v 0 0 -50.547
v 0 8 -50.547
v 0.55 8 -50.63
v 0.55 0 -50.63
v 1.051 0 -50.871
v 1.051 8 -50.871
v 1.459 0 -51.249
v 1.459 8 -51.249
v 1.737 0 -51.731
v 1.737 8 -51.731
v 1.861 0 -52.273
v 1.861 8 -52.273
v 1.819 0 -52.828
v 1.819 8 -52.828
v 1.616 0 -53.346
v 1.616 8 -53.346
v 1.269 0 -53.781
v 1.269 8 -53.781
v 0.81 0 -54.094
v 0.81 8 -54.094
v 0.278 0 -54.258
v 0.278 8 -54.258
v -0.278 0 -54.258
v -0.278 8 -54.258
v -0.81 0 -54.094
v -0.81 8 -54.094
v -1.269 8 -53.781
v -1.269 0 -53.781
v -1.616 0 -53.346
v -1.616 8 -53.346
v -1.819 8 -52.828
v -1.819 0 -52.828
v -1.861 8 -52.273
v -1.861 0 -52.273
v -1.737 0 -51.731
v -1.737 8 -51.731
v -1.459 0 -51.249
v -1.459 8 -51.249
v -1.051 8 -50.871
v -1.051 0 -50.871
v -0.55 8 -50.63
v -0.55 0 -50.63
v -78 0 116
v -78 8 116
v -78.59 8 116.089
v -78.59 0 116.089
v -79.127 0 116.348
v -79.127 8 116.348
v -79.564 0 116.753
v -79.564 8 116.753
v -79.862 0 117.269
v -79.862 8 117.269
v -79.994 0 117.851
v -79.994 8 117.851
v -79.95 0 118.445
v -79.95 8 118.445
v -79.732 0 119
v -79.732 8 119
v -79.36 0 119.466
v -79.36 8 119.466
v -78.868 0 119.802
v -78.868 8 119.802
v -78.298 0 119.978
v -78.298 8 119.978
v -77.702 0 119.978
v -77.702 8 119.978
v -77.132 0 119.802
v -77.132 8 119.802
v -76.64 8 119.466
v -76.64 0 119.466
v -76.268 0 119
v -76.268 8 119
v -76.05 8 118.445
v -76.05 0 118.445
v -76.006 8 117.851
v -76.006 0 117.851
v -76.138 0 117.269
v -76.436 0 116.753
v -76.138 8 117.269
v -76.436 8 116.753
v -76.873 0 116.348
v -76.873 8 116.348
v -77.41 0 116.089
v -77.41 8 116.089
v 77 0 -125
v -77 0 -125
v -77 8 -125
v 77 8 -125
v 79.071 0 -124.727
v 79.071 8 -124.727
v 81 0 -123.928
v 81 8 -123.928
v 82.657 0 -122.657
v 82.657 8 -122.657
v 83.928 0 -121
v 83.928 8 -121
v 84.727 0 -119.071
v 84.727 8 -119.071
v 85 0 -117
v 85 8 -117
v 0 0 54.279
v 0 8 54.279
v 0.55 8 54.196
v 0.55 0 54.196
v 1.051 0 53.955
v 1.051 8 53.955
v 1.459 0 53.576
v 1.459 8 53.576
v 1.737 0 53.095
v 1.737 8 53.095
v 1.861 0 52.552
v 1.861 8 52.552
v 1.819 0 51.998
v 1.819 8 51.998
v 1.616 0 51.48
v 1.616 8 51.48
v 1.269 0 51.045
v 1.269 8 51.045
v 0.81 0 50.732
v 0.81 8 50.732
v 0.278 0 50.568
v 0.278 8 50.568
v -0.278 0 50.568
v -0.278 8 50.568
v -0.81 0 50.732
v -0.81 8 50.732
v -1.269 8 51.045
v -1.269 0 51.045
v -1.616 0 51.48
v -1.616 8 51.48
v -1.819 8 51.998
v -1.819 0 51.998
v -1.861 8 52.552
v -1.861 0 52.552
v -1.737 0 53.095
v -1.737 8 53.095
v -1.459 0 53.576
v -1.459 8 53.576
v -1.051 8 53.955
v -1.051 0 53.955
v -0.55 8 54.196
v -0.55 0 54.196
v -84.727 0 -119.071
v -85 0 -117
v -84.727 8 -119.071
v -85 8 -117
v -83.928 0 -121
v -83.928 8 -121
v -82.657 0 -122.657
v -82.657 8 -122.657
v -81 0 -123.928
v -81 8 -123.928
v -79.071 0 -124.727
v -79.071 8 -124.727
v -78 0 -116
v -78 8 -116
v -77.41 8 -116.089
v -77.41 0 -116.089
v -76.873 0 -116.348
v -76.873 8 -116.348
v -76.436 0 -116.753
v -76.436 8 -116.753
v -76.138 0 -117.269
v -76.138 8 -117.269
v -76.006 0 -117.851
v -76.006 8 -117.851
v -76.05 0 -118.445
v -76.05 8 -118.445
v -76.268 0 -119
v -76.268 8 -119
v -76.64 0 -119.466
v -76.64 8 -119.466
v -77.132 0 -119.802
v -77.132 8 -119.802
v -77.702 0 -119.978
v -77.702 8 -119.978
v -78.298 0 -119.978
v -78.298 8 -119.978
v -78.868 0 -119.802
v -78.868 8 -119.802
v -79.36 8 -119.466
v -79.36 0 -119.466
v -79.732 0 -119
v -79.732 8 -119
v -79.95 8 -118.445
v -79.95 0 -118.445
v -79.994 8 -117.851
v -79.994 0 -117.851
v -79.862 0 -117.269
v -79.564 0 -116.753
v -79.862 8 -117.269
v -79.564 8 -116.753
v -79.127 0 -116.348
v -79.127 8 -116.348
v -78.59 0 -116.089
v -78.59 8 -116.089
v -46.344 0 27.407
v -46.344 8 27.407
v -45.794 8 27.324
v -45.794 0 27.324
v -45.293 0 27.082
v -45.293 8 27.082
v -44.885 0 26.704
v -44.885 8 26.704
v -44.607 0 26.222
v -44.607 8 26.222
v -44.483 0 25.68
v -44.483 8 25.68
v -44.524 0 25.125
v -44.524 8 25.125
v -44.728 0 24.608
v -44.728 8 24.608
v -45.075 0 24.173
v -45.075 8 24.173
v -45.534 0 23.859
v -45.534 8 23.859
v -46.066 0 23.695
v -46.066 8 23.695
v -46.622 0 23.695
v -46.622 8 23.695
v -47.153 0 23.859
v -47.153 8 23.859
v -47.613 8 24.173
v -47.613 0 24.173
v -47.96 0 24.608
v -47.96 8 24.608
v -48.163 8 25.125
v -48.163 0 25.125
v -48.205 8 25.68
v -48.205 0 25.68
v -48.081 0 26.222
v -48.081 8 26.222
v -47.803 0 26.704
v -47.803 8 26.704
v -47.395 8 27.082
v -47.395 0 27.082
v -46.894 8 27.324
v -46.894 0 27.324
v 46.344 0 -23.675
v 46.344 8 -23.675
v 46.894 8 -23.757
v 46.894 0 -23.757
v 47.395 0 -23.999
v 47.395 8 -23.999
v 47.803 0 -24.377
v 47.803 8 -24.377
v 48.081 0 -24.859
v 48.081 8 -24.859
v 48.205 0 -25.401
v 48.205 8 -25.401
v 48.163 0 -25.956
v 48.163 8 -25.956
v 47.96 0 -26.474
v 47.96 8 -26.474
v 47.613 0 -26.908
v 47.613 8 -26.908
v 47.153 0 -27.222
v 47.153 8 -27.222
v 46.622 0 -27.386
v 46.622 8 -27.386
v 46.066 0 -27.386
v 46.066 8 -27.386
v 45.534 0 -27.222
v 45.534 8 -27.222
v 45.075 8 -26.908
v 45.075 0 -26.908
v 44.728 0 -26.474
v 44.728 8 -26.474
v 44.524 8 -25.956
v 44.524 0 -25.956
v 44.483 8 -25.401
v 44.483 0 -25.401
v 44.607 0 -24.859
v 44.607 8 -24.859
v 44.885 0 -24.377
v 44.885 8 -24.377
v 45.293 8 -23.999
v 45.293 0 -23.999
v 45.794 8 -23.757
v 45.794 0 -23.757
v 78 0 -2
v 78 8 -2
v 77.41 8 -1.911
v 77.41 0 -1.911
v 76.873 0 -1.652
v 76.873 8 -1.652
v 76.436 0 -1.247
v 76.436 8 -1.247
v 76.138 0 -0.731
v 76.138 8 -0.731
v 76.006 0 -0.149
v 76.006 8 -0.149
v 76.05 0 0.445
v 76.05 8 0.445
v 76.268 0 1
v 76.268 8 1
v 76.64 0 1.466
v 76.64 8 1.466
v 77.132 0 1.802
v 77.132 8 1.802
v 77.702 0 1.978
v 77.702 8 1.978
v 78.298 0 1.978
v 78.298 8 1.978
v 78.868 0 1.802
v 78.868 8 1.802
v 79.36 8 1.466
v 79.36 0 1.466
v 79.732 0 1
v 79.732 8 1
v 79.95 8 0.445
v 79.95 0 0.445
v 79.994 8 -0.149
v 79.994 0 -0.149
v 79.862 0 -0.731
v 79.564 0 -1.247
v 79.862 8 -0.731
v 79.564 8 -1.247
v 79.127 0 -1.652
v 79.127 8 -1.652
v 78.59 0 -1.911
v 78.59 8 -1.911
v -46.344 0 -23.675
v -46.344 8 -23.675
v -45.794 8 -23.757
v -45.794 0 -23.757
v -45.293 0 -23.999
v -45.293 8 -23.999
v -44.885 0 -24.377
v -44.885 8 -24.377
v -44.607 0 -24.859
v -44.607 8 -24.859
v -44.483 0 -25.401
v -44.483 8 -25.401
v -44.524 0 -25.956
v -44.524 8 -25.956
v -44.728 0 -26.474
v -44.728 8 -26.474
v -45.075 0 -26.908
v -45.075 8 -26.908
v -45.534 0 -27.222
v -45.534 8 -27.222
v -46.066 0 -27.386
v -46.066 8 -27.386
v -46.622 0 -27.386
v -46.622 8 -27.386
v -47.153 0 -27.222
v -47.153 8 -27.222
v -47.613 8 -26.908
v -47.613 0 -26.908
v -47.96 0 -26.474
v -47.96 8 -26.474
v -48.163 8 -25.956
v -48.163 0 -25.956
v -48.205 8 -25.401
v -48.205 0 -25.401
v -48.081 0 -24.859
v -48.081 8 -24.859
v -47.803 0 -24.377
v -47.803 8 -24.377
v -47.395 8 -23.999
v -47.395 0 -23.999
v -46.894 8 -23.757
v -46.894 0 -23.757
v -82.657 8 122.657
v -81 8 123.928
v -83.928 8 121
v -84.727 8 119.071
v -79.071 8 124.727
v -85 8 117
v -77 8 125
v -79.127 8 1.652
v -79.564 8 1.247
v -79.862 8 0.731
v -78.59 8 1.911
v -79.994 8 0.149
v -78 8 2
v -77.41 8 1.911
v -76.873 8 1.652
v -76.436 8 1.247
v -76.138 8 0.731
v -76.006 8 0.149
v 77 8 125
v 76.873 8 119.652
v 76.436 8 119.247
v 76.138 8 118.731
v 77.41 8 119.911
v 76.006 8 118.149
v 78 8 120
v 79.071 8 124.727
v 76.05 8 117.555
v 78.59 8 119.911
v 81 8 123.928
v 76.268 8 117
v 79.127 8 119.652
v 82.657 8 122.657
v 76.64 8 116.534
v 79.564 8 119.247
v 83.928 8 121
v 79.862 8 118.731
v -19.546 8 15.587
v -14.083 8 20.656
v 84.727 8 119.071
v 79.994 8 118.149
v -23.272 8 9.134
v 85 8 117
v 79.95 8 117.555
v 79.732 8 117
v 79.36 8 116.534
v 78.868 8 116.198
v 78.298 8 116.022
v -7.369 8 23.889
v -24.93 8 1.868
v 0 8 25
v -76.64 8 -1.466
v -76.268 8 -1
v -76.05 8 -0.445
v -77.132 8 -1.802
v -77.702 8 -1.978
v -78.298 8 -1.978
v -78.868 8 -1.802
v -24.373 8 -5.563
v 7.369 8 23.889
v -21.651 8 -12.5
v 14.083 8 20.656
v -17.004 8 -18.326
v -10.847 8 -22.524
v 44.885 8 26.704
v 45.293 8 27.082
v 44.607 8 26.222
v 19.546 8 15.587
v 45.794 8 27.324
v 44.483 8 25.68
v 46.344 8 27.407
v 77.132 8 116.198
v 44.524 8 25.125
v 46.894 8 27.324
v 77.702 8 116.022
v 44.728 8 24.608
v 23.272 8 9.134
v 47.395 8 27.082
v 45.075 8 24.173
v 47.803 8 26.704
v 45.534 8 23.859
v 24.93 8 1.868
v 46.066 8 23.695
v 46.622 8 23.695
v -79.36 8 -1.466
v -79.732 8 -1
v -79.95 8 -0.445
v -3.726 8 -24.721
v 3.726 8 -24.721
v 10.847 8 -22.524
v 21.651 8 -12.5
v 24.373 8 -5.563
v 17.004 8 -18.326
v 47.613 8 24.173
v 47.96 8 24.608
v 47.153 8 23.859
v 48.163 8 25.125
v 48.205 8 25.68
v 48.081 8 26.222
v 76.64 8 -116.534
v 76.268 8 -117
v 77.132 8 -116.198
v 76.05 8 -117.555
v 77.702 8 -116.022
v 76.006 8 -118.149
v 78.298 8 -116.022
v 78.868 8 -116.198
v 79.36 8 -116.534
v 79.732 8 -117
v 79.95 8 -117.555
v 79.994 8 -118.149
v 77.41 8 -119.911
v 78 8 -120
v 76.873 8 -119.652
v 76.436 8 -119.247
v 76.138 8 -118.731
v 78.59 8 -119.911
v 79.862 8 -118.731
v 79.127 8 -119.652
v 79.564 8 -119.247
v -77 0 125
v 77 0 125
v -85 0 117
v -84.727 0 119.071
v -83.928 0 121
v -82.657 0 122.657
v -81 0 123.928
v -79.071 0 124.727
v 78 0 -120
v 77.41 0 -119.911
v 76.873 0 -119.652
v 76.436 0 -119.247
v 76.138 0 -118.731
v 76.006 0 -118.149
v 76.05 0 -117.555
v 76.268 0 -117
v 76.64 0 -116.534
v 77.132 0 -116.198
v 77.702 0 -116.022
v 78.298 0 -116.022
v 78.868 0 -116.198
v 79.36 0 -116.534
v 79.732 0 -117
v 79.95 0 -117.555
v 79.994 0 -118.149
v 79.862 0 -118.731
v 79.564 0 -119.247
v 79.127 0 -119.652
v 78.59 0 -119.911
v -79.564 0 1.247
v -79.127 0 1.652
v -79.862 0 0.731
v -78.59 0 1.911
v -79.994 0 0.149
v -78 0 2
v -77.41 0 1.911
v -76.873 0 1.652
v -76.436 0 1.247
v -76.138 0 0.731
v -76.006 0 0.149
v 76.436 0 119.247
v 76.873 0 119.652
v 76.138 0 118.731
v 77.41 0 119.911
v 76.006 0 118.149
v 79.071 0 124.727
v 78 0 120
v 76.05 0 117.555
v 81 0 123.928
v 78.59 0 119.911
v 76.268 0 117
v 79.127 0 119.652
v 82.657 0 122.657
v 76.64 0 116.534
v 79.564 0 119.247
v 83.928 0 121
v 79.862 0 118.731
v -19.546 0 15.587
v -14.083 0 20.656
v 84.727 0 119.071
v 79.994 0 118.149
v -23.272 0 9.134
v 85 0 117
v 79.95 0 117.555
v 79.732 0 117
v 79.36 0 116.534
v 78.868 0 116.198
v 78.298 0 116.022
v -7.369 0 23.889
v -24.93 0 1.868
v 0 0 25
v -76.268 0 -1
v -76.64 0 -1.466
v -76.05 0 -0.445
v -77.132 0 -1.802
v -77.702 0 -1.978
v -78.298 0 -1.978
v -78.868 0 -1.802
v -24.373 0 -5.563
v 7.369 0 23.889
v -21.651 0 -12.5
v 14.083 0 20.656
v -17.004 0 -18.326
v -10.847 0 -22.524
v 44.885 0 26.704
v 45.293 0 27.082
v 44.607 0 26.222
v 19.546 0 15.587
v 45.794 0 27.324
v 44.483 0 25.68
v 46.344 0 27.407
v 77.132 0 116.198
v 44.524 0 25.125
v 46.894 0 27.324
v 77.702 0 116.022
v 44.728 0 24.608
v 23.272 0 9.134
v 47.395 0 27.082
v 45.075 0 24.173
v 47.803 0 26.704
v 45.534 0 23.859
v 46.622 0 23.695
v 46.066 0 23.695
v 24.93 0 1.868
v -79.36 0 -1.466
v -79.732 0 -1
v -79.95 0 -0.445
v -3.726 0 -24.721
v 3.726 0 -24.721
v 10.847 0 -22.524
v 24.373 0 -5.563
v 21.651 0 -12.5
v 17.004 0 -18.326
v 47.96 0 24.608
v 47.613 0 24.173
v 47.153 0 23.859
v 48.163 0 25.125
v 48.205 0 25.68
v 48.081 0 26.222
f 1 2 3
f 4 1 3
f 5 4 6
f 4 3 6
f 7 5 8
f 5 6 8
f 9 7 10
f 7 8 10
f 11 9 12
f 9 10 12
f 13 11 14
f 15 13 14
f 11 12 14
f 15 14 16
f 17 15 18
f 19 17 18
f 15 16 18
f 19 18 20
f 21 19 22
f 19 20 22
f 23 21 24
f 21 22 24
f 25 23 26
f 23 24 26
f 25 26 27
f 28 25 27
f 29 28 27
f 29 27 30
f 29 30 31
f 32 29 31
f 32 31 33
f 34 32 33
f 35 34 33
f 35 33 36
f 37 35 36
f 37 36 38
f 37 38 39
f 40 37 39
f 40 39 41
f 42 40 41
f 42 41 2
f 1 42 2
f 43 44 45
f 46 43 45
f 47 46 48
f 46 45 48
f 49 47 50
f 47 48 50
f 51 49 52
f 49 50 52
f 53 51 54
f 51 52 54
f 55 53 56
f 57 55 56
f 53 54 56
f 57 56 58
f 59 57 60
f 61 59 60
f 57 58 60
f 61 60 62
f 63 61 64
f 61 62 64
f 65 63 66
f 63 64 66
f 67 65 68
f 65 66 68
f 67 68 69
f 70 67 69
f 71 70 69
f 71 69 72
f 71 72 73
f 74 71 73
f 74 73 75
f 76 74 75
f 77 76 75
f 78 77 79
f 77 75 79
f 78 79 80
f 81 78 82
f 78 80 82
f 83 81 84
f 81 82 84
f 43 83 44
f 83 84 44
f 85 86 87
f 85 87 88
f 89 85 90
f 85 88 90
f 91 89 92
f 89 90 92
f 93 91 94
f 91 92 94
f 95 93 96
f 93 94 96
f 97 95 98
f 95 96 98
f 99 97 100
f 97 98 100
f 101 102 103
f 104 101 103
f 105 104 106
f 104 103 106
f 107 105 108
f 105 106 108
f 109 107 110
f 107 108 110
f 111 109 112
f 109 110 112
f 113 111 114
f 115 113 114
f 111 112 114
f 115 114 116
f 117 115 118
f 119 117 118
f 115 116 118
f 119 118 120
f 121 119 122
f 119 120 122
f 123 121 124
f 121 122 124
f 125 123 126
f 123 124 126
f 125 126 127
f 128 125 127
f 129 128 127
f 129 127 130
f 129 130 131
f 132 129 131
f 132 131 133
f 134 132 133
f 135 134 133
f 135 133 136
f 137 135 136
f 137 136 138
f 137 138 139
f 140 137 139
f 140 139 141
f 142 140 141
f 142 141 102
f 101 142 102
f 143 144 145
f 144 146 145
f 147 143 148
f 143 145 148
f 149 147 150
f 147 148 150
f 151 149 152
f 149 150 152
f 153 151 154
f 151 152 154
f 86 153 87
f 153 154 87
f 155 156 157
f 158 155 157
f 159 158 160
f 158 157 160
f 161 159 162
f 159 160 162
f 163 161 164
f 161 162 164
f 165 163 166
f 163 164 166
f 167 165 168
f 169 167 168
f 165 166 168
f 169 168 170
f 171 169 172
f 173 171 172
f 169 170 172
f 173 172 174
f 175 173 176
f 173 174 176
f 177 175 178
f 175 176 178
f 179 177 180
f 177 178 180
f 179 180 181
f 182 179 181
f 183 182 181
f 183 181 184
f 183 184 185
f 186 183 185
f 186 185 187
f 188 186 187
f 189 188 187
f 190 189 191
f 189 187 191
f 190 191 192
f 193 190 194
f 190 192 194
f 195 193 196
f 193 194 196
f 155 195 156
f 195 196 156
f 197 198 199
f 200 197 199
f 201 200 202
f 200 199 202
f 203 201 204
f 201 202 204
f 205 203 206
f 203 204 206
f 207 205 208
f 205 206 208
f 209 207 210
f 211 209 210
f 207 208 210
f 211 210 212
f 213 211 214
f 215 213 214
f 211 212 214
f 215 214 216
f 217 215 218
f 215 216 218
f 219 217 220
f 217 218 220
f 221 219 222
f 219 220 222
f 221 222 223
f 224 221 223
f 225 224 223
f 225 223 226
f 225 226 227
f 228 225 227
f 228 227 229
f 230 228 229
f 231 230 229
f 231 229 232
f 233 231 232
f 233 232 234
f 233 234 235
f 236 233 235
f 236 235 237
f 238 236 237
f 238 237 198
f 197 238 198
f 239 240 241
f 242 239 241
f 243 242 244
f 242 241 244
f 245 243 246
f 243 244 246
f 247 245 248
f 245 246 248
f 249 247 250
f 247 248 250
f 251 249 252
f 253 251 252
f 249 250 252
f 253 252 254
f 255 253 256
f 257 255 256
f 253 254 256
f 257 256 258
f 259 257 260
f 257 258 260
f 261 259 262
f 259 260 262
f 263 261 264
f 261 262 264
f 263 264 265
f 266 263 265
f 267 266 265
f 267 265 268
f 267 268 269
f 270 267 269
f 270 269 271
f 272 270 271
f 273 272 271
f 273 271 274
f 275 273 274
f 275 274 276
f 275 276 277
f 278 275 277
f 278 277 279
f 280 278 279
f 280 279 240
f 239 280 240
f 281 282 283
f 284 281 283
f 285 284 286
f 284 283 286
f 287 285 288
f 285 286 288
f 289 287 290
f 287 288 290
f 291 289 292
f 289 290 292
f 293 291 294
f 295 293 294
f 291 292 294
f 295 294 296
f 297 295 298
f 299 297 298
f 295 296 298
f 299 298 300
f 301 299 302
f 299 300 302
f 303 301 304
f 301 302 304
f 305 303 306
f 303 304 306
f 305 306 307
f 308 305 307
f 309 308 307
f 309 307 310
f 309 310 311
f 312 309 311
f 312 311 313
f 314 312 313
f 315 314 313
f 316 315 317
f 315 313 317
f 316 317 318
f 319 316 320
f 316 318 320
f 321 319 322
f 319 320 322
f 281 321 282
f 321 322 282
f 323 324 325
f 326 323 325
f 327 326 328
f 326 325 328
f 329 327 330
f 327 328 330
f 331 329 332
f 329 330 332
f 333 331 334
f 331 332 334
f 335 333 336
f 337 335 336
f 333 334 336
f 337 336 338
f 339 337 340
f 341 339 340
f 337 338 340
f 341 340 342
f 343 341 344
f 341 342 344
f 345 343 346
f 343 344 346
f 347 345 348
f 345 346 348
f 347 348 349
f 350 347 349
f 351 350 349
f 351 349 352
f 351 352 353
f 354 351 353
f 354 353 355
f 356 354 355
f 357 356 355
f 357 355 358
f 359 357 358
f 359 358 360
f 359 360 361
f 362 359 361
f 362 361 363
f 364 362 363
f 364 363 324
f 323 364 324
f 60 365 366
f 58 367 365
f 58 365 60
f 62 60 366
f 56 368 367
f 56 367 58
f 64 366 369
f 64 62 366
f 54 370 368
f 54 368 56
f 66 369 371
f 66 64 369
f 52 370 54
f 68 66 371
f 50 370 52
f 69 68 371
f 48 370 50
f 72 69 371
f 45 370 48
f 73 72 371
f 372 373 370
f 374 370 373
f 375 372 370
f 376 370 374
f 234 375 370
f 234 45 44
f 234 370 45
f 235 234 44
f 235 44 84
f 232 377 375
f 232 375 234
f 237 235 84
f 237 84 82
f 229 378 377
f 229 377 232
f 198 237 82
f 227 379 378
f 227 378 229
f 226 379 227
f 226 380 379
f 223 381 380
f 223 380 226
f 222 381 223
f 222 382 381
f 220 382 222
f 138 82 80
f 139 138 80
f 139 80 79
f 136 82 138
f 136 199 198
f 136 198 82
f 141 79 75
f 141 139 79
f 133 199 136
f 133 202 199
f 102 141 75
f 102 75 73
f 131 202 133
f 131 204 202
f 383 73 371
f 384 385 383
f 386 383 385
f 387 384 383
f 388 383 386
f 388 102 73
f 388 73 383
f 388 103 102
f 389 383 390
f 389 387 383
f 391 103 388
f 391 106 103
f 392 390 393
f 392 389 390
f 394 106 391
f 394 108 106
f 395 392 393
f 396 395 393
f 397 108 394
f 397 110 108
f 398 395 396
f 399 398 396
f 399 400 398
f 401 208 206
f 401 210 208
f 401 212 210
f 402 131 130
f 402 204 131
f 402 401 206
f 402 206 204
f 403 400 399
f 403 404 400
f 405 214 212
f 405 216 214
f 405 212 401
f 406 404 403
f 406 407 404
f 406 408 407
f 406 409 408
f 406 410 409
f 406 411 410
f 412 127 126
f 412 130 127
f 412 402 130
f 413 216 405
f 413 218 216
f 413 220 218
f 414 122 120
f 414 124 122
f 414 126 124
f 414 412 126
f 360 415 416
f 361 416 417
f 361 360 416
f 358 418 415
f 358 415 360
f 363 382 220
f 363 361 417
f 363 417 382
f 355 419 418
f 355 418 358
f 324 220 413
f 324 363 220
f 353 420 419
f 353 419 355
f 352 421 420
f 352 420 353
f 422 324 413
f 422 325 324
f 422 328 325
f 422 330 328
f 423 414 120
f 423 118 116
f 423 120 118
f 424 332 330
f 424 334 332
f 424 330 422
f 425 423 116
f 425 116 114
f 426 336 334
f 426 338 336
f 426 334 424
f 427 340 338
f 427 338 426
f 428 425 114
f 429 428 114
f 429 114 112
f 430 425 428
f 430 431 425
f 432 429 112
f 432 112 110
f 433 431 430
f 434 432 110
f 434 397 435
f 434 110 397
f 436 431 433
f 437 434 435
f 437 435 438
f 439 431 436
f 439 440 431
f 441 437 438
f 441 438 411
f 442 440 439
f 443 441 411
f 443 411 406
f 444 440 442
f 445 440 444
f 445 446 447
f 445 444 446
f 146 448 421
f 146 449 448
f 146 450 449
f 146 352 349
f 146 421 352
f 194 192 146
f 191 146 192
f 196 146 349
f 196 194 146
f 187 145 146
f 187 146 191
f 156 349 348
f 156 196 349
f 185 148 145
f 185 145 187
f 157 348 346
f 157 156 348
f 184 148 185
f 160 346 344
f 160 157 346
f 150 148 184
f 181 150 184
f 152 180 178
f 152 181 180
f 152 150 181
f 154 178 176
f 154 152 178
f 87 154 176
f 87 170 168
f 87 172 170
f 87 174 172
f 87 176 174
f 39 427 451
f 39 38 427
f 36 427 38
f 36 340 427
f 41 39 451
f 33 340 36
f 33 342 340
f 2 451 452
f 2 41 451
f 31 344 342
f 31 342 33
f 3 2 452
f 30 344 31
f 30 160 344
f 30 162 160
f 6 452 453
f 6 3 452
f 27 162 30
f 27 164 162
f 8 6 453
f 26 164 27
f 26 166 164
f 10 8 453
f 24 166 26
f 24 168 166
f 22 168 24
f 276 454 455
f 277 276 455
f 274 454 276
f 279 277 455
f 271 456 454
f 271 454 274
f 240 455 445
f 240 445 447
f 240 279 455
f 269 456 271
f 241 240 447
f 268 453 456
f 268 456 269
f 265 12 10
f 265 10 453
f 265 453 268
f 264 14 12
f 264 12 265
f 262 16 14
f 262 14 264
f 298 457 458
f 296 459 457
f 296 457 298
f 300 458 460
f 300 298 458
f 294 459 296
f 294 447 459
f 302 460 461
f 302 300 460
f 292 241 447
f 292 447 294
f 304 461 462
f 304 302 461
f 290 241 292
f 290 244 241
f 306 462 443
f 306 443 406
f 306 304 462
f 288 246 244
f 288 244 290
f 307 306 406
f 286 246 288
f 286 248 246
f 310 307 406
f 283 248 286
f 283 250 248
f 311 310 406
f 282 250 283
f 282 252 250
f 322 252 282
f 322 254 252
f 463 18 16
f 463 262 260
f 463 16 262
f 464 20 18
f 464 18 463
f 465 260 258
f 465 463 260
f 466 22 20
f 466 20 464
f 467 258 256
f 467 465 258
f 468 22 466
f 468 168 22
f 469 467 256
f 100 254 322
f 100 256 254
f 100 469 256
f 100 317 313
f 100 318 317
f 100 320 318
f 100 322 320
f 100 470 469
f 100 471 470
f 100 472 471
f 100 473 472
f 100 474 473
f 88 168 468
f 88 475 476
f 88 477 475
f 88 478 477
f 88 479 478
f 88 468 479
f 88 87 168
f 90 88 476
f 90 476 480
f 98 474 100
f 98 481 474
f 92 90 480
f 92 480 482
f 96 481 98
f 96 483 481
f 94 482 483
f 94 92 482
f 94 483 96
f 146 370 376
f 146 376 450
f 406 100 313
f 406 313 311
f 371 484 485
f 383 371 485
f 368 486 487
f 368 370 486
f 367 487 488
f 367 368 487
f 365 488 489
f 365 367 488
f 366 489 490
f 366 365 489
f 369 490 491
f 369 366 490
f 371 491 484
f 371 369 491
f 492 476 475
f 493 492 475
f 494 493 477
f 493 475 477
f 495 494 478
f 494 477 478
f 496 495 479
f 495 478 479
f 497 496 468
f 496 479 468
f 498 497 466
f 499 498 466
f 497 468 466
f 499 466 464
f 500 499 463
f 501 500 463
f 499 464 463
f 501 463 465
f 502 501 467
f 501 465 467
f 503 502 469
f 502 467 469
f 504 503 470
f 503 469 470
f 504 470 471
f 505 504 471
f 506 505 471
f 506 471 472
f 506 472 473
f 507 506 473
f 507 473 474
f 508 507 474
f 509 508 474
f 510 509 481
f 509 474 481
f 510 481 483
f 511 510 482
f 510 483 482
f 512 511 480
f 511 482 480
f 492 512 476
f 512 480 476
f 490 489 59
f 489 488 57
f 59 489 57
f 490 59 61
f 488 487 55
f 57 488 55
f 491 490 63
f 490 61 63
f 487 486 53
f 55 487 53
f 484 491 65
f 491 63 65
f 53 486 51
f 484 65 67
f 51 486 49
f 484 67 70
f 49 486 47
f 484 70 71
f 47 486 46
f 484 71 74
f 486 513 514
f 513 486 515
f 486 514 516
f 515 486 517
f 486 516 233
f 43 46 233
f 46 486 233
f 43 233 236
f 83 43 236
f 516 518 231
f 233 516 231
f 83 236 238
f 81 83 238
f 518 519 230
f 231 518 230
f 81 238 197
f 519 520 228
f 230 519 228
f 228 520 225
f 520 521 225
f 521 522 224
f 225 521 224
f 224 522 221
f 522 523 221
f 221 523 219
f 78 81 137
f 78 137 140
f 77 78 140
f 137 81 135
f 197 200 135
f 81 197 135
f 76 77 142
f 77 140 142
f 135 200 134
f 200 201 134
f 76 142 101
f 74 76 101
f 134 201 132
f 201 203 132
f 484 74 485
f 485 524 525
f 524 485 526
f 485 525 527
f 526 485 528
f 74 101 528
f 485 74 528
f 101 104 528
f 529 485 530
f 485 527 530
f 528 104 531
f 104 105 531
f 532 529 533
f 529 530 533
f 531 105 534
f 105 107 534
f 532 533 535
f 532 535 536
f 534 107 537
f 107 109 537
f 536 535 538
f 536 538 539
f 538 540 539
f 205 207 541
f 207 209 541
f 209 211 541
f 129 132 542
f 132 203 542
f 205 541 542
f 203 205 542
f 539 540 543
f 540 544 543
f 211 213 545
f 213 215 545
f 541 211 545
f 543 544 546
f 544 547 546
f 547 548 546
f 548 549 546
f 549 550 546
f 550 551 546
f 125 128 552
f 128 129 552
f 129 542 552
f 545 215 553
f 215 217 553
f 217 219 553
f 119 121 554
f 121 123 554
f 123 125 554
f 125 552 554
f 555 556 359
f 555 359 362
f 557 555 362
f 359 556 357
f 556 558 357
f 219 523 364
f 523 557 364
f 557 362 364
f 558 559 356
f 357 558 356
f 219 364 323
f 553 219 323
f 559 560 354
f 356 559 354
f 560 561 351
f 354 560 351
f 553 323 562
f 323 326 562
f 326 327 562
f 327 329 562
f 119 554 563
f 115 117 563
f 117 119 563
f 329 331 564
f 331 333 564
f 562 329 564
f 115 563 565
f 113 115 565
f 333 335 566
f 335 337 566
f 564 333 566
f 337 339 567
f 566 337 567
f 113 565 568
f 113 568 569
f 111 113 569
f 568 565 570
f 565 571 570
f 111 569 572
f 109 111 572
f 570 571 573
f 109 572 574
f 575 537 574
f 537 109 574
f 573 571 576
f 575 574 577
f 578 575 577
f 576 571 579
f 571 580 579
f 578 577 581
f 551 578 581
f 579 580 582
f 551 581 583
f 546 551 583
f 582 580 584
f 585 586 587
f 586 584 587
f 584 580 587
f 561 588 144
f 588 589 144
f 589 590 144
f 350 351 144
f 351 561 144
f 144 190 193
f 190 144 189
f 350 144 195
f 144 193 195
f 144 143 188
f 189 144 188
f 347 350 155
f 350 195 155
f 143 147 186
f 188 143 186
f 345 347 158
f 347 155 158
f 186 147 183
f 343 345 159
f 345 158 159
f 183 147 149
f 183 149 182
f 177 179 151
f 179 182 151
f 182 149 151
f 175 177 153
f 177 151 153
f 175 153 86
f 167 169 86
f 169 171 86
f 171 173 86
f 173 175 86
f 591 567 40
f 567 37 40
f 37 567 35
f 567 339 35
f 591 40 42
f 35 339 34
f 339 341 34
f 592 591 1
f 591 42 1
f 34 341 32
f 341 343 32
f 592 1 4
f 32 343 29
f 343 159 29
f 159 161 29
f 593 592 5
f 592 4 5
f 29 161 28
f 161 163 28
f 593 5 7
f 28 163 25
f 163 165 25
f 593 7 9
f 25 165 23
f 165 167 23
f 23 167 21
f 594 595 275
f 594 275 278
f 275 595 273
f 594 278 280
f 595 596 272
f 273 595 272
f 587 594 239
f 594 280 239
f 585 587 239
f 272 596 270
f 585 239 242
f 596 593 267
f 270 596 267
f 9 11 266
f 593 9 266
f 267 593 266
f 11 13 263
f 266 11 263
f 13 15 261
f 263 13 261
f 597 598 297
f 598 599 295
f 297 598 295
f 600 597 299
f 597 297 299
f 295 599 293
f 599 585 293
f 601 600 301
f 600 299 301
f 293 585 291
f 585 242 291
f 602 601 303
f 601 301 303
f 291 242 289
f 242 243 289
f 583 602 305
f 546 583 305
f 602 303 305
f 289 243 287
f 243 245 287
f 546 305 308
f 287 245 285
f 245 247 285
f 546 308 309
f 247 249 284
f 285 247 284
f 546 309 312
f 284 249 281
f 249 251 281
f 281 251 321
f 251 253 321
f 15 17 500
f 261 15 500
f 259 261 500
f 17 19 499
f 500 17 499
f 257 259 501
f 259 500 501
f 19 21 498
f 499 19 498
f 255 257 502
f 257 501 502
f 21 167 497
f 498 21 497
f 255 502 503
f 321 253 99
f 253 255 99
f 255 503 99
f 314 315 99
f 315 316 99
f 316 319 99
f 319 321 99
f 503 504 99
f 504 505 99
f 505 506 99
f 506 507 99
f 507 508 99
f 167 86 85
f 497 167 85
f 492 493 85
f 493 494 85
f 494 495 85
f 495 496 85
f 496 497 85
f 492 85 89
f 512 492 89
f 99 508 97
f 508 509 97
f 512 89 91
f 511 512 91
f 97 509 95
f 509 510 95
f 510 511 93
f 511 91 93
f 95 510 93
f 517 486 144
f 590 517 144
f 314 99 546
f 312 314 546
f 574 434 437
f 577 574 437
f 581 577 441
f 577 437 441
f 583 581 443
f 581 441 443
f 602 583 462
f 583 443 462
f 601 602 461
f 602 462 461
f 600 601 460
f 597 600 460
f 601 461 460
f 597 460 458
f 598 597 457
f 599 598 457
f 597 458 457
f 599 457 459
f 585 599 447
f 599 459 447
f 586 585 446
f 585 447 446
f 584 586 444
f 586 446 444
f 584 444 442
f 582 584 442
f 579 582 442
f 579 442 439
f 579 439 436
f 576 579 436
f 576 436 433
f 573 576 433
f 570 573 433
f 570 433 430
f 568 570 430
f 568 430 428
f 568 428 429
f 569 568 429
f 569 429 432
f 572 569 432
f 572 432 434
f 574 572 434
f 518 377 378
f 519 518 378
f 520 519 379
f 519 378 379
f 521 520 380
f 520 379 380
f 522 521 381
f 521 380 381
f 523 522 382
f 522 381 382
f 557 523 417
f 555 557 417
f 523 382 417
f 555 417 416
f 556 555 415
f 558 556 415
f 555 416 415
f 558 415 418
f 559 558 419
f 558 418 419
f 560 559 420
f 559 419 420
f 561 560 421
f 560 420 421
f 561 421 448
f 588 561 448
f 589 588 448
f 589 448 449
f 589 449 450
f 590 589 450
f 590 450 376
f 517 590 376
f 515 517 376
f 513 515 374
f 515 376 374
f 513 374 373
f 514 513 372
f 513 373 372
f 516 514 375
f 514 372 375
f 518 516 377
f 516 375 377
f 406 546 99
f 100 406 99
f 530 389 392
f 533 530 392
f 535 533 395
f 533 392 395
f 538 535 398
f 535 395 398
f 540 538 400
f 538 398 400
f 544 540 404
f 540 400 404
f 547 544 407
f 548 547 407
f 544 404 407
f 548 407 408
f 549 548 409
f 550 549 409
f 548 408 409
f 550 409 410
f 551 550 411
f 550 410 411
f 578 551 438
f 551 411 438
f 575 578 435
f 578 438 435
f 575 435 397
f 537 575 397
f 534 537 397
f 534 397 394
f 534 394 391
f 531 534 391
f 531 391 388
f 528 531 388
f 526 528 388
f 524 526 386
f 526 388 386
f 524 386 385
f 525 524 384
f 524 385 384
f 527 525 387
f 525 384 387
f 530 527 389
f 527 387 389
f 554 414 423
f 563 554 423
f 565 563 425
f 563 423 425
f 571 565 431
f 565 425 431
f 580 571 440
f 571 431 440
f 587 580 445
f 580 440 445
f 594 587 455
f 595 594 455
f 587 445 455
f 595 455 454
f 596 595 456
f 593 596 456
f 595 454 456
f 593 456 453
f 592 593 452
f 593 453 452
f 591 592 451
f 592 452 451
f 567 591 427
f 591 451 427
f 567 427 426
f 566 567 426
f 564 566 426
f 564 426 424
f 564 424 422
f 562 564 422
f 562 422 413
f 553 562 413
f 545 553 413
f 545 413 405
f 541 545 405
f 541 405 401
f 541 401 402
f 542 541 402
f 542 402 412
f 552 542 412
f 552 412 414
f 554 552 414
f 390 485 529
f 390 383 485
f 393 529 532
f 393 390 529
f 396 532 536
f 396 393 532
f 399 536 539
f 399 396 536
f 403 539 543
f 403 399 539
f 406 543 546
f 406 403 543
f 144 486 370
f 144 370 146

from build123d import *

# Parameters (mm, degrees)
SKETCH1_W             = 170
SKETCH1_H             = 250
BOSS_EXTRUDE1_DEPTH   = 8
SKETCH3_R             = 2
CUT_EXTRUDE2_DEPTH    = 8
FILLET1_R             = 8
CROQUIS1_R            = 25
CROQUIS1_R_2          = 1.866016506
CORTAR_EXTRUIR3_DEPTH = 10


with BuildPart() as part:
    # Sketch1 → Boss-Extrude1 (new body)
    with BuildSketch(Plane(origin=(0, 0, 0), x_dir=(1, 0, 0), z_dir=(0, 1, 0))):
        Rectangle(SKETCH1_W, SKETCH1_H)
    extrude(amount=BOSS_EXTRUDE1_DEPTH)

    # Sketch3 → Cut-Extrude2 (cut)
    with BuildSketch(Plane(origin=(0, 8, 0), x_dir=(1, 0, 0), z_dir=(0, 1, 0))):
        with Locations(Location((-78, 118, 0), (0, 0, 270))):
            Circle(SKETCH3_R)
        with Locations(Location((78, 118, 0), (0, 0, 90))):
            Circle(SKETCH3_R)
        with Locations(Location((78, -118, 0), (0, 0, 270))):
            Circle(SKETCH3_R)
        with Locations(Location((-78, -118, 0), (0, 0, 90))):
            Circle(SKETCH3_R)
        with Locations(Location((-78, 0, 0), (0, 0, 270))):
            Circle(SKETCH3_R)
        with Locations(Location((78, 0, 0), (0, 0, 90))):
            Circle(SKETCH3_R)
    extrude(amount=-CUT_EXTRUDE2_DEPTH, mode=Mode.SUBTRACT)

    # Fillet1
    fillet1_edges = [part.edges().sort_by_distance(p)[0] for p in [
        (85, 4, 125),
        (-85, 4, 125),
        (-85, 4, -125),
        (85, 4, -125),
    ]]
    fillet(fillet1_edges, radius=FILLET1_R)

    # Croquis1 → Cortar-Extruir3 (cut)
    with BuildSketch(Plane(origin=(0, 8, 0), x_dir=(1, 0, 0), z_dir=(0, 1, 0))):
        with Locations(Location((0, 0, 0), (0, 0, 270))):
            Circle(CROQUIS1_R)
        with Locations(Location((0, 52.412836982, 0), (0, 0, 270))):
            Circle(CROQUIS1_R_2)
        with Locations(Location((-46.34372748, 25.540560465, 0), (0, 0, 270))):
            Circle(CROQUIS1_R_2)
        with Locations(Location((0, -52.412836982, 0), (0, 0, 270))):
            Circle(CROQUIS1_R_2)
        with Locations(Location((-46.34372748, -25.540560465, 0), (0, 0, 270))):
            Circle(CROQUIS1_R_2)
        with Locations(Location((46.34372748, 25.540560465, 0), (0, 0, 270))):
            Circle(CROQUIS1_R_2)
        with Locations(Location((46.34372748, -25.540560465, 0), (0, 0, 270))):
            Circle(CROQUIS1_R_2)
    extrude(amount=-CORTAR_EXTRUIR3_DEPTH, mode=Mode.SUBTRACT)


solid = part.part
